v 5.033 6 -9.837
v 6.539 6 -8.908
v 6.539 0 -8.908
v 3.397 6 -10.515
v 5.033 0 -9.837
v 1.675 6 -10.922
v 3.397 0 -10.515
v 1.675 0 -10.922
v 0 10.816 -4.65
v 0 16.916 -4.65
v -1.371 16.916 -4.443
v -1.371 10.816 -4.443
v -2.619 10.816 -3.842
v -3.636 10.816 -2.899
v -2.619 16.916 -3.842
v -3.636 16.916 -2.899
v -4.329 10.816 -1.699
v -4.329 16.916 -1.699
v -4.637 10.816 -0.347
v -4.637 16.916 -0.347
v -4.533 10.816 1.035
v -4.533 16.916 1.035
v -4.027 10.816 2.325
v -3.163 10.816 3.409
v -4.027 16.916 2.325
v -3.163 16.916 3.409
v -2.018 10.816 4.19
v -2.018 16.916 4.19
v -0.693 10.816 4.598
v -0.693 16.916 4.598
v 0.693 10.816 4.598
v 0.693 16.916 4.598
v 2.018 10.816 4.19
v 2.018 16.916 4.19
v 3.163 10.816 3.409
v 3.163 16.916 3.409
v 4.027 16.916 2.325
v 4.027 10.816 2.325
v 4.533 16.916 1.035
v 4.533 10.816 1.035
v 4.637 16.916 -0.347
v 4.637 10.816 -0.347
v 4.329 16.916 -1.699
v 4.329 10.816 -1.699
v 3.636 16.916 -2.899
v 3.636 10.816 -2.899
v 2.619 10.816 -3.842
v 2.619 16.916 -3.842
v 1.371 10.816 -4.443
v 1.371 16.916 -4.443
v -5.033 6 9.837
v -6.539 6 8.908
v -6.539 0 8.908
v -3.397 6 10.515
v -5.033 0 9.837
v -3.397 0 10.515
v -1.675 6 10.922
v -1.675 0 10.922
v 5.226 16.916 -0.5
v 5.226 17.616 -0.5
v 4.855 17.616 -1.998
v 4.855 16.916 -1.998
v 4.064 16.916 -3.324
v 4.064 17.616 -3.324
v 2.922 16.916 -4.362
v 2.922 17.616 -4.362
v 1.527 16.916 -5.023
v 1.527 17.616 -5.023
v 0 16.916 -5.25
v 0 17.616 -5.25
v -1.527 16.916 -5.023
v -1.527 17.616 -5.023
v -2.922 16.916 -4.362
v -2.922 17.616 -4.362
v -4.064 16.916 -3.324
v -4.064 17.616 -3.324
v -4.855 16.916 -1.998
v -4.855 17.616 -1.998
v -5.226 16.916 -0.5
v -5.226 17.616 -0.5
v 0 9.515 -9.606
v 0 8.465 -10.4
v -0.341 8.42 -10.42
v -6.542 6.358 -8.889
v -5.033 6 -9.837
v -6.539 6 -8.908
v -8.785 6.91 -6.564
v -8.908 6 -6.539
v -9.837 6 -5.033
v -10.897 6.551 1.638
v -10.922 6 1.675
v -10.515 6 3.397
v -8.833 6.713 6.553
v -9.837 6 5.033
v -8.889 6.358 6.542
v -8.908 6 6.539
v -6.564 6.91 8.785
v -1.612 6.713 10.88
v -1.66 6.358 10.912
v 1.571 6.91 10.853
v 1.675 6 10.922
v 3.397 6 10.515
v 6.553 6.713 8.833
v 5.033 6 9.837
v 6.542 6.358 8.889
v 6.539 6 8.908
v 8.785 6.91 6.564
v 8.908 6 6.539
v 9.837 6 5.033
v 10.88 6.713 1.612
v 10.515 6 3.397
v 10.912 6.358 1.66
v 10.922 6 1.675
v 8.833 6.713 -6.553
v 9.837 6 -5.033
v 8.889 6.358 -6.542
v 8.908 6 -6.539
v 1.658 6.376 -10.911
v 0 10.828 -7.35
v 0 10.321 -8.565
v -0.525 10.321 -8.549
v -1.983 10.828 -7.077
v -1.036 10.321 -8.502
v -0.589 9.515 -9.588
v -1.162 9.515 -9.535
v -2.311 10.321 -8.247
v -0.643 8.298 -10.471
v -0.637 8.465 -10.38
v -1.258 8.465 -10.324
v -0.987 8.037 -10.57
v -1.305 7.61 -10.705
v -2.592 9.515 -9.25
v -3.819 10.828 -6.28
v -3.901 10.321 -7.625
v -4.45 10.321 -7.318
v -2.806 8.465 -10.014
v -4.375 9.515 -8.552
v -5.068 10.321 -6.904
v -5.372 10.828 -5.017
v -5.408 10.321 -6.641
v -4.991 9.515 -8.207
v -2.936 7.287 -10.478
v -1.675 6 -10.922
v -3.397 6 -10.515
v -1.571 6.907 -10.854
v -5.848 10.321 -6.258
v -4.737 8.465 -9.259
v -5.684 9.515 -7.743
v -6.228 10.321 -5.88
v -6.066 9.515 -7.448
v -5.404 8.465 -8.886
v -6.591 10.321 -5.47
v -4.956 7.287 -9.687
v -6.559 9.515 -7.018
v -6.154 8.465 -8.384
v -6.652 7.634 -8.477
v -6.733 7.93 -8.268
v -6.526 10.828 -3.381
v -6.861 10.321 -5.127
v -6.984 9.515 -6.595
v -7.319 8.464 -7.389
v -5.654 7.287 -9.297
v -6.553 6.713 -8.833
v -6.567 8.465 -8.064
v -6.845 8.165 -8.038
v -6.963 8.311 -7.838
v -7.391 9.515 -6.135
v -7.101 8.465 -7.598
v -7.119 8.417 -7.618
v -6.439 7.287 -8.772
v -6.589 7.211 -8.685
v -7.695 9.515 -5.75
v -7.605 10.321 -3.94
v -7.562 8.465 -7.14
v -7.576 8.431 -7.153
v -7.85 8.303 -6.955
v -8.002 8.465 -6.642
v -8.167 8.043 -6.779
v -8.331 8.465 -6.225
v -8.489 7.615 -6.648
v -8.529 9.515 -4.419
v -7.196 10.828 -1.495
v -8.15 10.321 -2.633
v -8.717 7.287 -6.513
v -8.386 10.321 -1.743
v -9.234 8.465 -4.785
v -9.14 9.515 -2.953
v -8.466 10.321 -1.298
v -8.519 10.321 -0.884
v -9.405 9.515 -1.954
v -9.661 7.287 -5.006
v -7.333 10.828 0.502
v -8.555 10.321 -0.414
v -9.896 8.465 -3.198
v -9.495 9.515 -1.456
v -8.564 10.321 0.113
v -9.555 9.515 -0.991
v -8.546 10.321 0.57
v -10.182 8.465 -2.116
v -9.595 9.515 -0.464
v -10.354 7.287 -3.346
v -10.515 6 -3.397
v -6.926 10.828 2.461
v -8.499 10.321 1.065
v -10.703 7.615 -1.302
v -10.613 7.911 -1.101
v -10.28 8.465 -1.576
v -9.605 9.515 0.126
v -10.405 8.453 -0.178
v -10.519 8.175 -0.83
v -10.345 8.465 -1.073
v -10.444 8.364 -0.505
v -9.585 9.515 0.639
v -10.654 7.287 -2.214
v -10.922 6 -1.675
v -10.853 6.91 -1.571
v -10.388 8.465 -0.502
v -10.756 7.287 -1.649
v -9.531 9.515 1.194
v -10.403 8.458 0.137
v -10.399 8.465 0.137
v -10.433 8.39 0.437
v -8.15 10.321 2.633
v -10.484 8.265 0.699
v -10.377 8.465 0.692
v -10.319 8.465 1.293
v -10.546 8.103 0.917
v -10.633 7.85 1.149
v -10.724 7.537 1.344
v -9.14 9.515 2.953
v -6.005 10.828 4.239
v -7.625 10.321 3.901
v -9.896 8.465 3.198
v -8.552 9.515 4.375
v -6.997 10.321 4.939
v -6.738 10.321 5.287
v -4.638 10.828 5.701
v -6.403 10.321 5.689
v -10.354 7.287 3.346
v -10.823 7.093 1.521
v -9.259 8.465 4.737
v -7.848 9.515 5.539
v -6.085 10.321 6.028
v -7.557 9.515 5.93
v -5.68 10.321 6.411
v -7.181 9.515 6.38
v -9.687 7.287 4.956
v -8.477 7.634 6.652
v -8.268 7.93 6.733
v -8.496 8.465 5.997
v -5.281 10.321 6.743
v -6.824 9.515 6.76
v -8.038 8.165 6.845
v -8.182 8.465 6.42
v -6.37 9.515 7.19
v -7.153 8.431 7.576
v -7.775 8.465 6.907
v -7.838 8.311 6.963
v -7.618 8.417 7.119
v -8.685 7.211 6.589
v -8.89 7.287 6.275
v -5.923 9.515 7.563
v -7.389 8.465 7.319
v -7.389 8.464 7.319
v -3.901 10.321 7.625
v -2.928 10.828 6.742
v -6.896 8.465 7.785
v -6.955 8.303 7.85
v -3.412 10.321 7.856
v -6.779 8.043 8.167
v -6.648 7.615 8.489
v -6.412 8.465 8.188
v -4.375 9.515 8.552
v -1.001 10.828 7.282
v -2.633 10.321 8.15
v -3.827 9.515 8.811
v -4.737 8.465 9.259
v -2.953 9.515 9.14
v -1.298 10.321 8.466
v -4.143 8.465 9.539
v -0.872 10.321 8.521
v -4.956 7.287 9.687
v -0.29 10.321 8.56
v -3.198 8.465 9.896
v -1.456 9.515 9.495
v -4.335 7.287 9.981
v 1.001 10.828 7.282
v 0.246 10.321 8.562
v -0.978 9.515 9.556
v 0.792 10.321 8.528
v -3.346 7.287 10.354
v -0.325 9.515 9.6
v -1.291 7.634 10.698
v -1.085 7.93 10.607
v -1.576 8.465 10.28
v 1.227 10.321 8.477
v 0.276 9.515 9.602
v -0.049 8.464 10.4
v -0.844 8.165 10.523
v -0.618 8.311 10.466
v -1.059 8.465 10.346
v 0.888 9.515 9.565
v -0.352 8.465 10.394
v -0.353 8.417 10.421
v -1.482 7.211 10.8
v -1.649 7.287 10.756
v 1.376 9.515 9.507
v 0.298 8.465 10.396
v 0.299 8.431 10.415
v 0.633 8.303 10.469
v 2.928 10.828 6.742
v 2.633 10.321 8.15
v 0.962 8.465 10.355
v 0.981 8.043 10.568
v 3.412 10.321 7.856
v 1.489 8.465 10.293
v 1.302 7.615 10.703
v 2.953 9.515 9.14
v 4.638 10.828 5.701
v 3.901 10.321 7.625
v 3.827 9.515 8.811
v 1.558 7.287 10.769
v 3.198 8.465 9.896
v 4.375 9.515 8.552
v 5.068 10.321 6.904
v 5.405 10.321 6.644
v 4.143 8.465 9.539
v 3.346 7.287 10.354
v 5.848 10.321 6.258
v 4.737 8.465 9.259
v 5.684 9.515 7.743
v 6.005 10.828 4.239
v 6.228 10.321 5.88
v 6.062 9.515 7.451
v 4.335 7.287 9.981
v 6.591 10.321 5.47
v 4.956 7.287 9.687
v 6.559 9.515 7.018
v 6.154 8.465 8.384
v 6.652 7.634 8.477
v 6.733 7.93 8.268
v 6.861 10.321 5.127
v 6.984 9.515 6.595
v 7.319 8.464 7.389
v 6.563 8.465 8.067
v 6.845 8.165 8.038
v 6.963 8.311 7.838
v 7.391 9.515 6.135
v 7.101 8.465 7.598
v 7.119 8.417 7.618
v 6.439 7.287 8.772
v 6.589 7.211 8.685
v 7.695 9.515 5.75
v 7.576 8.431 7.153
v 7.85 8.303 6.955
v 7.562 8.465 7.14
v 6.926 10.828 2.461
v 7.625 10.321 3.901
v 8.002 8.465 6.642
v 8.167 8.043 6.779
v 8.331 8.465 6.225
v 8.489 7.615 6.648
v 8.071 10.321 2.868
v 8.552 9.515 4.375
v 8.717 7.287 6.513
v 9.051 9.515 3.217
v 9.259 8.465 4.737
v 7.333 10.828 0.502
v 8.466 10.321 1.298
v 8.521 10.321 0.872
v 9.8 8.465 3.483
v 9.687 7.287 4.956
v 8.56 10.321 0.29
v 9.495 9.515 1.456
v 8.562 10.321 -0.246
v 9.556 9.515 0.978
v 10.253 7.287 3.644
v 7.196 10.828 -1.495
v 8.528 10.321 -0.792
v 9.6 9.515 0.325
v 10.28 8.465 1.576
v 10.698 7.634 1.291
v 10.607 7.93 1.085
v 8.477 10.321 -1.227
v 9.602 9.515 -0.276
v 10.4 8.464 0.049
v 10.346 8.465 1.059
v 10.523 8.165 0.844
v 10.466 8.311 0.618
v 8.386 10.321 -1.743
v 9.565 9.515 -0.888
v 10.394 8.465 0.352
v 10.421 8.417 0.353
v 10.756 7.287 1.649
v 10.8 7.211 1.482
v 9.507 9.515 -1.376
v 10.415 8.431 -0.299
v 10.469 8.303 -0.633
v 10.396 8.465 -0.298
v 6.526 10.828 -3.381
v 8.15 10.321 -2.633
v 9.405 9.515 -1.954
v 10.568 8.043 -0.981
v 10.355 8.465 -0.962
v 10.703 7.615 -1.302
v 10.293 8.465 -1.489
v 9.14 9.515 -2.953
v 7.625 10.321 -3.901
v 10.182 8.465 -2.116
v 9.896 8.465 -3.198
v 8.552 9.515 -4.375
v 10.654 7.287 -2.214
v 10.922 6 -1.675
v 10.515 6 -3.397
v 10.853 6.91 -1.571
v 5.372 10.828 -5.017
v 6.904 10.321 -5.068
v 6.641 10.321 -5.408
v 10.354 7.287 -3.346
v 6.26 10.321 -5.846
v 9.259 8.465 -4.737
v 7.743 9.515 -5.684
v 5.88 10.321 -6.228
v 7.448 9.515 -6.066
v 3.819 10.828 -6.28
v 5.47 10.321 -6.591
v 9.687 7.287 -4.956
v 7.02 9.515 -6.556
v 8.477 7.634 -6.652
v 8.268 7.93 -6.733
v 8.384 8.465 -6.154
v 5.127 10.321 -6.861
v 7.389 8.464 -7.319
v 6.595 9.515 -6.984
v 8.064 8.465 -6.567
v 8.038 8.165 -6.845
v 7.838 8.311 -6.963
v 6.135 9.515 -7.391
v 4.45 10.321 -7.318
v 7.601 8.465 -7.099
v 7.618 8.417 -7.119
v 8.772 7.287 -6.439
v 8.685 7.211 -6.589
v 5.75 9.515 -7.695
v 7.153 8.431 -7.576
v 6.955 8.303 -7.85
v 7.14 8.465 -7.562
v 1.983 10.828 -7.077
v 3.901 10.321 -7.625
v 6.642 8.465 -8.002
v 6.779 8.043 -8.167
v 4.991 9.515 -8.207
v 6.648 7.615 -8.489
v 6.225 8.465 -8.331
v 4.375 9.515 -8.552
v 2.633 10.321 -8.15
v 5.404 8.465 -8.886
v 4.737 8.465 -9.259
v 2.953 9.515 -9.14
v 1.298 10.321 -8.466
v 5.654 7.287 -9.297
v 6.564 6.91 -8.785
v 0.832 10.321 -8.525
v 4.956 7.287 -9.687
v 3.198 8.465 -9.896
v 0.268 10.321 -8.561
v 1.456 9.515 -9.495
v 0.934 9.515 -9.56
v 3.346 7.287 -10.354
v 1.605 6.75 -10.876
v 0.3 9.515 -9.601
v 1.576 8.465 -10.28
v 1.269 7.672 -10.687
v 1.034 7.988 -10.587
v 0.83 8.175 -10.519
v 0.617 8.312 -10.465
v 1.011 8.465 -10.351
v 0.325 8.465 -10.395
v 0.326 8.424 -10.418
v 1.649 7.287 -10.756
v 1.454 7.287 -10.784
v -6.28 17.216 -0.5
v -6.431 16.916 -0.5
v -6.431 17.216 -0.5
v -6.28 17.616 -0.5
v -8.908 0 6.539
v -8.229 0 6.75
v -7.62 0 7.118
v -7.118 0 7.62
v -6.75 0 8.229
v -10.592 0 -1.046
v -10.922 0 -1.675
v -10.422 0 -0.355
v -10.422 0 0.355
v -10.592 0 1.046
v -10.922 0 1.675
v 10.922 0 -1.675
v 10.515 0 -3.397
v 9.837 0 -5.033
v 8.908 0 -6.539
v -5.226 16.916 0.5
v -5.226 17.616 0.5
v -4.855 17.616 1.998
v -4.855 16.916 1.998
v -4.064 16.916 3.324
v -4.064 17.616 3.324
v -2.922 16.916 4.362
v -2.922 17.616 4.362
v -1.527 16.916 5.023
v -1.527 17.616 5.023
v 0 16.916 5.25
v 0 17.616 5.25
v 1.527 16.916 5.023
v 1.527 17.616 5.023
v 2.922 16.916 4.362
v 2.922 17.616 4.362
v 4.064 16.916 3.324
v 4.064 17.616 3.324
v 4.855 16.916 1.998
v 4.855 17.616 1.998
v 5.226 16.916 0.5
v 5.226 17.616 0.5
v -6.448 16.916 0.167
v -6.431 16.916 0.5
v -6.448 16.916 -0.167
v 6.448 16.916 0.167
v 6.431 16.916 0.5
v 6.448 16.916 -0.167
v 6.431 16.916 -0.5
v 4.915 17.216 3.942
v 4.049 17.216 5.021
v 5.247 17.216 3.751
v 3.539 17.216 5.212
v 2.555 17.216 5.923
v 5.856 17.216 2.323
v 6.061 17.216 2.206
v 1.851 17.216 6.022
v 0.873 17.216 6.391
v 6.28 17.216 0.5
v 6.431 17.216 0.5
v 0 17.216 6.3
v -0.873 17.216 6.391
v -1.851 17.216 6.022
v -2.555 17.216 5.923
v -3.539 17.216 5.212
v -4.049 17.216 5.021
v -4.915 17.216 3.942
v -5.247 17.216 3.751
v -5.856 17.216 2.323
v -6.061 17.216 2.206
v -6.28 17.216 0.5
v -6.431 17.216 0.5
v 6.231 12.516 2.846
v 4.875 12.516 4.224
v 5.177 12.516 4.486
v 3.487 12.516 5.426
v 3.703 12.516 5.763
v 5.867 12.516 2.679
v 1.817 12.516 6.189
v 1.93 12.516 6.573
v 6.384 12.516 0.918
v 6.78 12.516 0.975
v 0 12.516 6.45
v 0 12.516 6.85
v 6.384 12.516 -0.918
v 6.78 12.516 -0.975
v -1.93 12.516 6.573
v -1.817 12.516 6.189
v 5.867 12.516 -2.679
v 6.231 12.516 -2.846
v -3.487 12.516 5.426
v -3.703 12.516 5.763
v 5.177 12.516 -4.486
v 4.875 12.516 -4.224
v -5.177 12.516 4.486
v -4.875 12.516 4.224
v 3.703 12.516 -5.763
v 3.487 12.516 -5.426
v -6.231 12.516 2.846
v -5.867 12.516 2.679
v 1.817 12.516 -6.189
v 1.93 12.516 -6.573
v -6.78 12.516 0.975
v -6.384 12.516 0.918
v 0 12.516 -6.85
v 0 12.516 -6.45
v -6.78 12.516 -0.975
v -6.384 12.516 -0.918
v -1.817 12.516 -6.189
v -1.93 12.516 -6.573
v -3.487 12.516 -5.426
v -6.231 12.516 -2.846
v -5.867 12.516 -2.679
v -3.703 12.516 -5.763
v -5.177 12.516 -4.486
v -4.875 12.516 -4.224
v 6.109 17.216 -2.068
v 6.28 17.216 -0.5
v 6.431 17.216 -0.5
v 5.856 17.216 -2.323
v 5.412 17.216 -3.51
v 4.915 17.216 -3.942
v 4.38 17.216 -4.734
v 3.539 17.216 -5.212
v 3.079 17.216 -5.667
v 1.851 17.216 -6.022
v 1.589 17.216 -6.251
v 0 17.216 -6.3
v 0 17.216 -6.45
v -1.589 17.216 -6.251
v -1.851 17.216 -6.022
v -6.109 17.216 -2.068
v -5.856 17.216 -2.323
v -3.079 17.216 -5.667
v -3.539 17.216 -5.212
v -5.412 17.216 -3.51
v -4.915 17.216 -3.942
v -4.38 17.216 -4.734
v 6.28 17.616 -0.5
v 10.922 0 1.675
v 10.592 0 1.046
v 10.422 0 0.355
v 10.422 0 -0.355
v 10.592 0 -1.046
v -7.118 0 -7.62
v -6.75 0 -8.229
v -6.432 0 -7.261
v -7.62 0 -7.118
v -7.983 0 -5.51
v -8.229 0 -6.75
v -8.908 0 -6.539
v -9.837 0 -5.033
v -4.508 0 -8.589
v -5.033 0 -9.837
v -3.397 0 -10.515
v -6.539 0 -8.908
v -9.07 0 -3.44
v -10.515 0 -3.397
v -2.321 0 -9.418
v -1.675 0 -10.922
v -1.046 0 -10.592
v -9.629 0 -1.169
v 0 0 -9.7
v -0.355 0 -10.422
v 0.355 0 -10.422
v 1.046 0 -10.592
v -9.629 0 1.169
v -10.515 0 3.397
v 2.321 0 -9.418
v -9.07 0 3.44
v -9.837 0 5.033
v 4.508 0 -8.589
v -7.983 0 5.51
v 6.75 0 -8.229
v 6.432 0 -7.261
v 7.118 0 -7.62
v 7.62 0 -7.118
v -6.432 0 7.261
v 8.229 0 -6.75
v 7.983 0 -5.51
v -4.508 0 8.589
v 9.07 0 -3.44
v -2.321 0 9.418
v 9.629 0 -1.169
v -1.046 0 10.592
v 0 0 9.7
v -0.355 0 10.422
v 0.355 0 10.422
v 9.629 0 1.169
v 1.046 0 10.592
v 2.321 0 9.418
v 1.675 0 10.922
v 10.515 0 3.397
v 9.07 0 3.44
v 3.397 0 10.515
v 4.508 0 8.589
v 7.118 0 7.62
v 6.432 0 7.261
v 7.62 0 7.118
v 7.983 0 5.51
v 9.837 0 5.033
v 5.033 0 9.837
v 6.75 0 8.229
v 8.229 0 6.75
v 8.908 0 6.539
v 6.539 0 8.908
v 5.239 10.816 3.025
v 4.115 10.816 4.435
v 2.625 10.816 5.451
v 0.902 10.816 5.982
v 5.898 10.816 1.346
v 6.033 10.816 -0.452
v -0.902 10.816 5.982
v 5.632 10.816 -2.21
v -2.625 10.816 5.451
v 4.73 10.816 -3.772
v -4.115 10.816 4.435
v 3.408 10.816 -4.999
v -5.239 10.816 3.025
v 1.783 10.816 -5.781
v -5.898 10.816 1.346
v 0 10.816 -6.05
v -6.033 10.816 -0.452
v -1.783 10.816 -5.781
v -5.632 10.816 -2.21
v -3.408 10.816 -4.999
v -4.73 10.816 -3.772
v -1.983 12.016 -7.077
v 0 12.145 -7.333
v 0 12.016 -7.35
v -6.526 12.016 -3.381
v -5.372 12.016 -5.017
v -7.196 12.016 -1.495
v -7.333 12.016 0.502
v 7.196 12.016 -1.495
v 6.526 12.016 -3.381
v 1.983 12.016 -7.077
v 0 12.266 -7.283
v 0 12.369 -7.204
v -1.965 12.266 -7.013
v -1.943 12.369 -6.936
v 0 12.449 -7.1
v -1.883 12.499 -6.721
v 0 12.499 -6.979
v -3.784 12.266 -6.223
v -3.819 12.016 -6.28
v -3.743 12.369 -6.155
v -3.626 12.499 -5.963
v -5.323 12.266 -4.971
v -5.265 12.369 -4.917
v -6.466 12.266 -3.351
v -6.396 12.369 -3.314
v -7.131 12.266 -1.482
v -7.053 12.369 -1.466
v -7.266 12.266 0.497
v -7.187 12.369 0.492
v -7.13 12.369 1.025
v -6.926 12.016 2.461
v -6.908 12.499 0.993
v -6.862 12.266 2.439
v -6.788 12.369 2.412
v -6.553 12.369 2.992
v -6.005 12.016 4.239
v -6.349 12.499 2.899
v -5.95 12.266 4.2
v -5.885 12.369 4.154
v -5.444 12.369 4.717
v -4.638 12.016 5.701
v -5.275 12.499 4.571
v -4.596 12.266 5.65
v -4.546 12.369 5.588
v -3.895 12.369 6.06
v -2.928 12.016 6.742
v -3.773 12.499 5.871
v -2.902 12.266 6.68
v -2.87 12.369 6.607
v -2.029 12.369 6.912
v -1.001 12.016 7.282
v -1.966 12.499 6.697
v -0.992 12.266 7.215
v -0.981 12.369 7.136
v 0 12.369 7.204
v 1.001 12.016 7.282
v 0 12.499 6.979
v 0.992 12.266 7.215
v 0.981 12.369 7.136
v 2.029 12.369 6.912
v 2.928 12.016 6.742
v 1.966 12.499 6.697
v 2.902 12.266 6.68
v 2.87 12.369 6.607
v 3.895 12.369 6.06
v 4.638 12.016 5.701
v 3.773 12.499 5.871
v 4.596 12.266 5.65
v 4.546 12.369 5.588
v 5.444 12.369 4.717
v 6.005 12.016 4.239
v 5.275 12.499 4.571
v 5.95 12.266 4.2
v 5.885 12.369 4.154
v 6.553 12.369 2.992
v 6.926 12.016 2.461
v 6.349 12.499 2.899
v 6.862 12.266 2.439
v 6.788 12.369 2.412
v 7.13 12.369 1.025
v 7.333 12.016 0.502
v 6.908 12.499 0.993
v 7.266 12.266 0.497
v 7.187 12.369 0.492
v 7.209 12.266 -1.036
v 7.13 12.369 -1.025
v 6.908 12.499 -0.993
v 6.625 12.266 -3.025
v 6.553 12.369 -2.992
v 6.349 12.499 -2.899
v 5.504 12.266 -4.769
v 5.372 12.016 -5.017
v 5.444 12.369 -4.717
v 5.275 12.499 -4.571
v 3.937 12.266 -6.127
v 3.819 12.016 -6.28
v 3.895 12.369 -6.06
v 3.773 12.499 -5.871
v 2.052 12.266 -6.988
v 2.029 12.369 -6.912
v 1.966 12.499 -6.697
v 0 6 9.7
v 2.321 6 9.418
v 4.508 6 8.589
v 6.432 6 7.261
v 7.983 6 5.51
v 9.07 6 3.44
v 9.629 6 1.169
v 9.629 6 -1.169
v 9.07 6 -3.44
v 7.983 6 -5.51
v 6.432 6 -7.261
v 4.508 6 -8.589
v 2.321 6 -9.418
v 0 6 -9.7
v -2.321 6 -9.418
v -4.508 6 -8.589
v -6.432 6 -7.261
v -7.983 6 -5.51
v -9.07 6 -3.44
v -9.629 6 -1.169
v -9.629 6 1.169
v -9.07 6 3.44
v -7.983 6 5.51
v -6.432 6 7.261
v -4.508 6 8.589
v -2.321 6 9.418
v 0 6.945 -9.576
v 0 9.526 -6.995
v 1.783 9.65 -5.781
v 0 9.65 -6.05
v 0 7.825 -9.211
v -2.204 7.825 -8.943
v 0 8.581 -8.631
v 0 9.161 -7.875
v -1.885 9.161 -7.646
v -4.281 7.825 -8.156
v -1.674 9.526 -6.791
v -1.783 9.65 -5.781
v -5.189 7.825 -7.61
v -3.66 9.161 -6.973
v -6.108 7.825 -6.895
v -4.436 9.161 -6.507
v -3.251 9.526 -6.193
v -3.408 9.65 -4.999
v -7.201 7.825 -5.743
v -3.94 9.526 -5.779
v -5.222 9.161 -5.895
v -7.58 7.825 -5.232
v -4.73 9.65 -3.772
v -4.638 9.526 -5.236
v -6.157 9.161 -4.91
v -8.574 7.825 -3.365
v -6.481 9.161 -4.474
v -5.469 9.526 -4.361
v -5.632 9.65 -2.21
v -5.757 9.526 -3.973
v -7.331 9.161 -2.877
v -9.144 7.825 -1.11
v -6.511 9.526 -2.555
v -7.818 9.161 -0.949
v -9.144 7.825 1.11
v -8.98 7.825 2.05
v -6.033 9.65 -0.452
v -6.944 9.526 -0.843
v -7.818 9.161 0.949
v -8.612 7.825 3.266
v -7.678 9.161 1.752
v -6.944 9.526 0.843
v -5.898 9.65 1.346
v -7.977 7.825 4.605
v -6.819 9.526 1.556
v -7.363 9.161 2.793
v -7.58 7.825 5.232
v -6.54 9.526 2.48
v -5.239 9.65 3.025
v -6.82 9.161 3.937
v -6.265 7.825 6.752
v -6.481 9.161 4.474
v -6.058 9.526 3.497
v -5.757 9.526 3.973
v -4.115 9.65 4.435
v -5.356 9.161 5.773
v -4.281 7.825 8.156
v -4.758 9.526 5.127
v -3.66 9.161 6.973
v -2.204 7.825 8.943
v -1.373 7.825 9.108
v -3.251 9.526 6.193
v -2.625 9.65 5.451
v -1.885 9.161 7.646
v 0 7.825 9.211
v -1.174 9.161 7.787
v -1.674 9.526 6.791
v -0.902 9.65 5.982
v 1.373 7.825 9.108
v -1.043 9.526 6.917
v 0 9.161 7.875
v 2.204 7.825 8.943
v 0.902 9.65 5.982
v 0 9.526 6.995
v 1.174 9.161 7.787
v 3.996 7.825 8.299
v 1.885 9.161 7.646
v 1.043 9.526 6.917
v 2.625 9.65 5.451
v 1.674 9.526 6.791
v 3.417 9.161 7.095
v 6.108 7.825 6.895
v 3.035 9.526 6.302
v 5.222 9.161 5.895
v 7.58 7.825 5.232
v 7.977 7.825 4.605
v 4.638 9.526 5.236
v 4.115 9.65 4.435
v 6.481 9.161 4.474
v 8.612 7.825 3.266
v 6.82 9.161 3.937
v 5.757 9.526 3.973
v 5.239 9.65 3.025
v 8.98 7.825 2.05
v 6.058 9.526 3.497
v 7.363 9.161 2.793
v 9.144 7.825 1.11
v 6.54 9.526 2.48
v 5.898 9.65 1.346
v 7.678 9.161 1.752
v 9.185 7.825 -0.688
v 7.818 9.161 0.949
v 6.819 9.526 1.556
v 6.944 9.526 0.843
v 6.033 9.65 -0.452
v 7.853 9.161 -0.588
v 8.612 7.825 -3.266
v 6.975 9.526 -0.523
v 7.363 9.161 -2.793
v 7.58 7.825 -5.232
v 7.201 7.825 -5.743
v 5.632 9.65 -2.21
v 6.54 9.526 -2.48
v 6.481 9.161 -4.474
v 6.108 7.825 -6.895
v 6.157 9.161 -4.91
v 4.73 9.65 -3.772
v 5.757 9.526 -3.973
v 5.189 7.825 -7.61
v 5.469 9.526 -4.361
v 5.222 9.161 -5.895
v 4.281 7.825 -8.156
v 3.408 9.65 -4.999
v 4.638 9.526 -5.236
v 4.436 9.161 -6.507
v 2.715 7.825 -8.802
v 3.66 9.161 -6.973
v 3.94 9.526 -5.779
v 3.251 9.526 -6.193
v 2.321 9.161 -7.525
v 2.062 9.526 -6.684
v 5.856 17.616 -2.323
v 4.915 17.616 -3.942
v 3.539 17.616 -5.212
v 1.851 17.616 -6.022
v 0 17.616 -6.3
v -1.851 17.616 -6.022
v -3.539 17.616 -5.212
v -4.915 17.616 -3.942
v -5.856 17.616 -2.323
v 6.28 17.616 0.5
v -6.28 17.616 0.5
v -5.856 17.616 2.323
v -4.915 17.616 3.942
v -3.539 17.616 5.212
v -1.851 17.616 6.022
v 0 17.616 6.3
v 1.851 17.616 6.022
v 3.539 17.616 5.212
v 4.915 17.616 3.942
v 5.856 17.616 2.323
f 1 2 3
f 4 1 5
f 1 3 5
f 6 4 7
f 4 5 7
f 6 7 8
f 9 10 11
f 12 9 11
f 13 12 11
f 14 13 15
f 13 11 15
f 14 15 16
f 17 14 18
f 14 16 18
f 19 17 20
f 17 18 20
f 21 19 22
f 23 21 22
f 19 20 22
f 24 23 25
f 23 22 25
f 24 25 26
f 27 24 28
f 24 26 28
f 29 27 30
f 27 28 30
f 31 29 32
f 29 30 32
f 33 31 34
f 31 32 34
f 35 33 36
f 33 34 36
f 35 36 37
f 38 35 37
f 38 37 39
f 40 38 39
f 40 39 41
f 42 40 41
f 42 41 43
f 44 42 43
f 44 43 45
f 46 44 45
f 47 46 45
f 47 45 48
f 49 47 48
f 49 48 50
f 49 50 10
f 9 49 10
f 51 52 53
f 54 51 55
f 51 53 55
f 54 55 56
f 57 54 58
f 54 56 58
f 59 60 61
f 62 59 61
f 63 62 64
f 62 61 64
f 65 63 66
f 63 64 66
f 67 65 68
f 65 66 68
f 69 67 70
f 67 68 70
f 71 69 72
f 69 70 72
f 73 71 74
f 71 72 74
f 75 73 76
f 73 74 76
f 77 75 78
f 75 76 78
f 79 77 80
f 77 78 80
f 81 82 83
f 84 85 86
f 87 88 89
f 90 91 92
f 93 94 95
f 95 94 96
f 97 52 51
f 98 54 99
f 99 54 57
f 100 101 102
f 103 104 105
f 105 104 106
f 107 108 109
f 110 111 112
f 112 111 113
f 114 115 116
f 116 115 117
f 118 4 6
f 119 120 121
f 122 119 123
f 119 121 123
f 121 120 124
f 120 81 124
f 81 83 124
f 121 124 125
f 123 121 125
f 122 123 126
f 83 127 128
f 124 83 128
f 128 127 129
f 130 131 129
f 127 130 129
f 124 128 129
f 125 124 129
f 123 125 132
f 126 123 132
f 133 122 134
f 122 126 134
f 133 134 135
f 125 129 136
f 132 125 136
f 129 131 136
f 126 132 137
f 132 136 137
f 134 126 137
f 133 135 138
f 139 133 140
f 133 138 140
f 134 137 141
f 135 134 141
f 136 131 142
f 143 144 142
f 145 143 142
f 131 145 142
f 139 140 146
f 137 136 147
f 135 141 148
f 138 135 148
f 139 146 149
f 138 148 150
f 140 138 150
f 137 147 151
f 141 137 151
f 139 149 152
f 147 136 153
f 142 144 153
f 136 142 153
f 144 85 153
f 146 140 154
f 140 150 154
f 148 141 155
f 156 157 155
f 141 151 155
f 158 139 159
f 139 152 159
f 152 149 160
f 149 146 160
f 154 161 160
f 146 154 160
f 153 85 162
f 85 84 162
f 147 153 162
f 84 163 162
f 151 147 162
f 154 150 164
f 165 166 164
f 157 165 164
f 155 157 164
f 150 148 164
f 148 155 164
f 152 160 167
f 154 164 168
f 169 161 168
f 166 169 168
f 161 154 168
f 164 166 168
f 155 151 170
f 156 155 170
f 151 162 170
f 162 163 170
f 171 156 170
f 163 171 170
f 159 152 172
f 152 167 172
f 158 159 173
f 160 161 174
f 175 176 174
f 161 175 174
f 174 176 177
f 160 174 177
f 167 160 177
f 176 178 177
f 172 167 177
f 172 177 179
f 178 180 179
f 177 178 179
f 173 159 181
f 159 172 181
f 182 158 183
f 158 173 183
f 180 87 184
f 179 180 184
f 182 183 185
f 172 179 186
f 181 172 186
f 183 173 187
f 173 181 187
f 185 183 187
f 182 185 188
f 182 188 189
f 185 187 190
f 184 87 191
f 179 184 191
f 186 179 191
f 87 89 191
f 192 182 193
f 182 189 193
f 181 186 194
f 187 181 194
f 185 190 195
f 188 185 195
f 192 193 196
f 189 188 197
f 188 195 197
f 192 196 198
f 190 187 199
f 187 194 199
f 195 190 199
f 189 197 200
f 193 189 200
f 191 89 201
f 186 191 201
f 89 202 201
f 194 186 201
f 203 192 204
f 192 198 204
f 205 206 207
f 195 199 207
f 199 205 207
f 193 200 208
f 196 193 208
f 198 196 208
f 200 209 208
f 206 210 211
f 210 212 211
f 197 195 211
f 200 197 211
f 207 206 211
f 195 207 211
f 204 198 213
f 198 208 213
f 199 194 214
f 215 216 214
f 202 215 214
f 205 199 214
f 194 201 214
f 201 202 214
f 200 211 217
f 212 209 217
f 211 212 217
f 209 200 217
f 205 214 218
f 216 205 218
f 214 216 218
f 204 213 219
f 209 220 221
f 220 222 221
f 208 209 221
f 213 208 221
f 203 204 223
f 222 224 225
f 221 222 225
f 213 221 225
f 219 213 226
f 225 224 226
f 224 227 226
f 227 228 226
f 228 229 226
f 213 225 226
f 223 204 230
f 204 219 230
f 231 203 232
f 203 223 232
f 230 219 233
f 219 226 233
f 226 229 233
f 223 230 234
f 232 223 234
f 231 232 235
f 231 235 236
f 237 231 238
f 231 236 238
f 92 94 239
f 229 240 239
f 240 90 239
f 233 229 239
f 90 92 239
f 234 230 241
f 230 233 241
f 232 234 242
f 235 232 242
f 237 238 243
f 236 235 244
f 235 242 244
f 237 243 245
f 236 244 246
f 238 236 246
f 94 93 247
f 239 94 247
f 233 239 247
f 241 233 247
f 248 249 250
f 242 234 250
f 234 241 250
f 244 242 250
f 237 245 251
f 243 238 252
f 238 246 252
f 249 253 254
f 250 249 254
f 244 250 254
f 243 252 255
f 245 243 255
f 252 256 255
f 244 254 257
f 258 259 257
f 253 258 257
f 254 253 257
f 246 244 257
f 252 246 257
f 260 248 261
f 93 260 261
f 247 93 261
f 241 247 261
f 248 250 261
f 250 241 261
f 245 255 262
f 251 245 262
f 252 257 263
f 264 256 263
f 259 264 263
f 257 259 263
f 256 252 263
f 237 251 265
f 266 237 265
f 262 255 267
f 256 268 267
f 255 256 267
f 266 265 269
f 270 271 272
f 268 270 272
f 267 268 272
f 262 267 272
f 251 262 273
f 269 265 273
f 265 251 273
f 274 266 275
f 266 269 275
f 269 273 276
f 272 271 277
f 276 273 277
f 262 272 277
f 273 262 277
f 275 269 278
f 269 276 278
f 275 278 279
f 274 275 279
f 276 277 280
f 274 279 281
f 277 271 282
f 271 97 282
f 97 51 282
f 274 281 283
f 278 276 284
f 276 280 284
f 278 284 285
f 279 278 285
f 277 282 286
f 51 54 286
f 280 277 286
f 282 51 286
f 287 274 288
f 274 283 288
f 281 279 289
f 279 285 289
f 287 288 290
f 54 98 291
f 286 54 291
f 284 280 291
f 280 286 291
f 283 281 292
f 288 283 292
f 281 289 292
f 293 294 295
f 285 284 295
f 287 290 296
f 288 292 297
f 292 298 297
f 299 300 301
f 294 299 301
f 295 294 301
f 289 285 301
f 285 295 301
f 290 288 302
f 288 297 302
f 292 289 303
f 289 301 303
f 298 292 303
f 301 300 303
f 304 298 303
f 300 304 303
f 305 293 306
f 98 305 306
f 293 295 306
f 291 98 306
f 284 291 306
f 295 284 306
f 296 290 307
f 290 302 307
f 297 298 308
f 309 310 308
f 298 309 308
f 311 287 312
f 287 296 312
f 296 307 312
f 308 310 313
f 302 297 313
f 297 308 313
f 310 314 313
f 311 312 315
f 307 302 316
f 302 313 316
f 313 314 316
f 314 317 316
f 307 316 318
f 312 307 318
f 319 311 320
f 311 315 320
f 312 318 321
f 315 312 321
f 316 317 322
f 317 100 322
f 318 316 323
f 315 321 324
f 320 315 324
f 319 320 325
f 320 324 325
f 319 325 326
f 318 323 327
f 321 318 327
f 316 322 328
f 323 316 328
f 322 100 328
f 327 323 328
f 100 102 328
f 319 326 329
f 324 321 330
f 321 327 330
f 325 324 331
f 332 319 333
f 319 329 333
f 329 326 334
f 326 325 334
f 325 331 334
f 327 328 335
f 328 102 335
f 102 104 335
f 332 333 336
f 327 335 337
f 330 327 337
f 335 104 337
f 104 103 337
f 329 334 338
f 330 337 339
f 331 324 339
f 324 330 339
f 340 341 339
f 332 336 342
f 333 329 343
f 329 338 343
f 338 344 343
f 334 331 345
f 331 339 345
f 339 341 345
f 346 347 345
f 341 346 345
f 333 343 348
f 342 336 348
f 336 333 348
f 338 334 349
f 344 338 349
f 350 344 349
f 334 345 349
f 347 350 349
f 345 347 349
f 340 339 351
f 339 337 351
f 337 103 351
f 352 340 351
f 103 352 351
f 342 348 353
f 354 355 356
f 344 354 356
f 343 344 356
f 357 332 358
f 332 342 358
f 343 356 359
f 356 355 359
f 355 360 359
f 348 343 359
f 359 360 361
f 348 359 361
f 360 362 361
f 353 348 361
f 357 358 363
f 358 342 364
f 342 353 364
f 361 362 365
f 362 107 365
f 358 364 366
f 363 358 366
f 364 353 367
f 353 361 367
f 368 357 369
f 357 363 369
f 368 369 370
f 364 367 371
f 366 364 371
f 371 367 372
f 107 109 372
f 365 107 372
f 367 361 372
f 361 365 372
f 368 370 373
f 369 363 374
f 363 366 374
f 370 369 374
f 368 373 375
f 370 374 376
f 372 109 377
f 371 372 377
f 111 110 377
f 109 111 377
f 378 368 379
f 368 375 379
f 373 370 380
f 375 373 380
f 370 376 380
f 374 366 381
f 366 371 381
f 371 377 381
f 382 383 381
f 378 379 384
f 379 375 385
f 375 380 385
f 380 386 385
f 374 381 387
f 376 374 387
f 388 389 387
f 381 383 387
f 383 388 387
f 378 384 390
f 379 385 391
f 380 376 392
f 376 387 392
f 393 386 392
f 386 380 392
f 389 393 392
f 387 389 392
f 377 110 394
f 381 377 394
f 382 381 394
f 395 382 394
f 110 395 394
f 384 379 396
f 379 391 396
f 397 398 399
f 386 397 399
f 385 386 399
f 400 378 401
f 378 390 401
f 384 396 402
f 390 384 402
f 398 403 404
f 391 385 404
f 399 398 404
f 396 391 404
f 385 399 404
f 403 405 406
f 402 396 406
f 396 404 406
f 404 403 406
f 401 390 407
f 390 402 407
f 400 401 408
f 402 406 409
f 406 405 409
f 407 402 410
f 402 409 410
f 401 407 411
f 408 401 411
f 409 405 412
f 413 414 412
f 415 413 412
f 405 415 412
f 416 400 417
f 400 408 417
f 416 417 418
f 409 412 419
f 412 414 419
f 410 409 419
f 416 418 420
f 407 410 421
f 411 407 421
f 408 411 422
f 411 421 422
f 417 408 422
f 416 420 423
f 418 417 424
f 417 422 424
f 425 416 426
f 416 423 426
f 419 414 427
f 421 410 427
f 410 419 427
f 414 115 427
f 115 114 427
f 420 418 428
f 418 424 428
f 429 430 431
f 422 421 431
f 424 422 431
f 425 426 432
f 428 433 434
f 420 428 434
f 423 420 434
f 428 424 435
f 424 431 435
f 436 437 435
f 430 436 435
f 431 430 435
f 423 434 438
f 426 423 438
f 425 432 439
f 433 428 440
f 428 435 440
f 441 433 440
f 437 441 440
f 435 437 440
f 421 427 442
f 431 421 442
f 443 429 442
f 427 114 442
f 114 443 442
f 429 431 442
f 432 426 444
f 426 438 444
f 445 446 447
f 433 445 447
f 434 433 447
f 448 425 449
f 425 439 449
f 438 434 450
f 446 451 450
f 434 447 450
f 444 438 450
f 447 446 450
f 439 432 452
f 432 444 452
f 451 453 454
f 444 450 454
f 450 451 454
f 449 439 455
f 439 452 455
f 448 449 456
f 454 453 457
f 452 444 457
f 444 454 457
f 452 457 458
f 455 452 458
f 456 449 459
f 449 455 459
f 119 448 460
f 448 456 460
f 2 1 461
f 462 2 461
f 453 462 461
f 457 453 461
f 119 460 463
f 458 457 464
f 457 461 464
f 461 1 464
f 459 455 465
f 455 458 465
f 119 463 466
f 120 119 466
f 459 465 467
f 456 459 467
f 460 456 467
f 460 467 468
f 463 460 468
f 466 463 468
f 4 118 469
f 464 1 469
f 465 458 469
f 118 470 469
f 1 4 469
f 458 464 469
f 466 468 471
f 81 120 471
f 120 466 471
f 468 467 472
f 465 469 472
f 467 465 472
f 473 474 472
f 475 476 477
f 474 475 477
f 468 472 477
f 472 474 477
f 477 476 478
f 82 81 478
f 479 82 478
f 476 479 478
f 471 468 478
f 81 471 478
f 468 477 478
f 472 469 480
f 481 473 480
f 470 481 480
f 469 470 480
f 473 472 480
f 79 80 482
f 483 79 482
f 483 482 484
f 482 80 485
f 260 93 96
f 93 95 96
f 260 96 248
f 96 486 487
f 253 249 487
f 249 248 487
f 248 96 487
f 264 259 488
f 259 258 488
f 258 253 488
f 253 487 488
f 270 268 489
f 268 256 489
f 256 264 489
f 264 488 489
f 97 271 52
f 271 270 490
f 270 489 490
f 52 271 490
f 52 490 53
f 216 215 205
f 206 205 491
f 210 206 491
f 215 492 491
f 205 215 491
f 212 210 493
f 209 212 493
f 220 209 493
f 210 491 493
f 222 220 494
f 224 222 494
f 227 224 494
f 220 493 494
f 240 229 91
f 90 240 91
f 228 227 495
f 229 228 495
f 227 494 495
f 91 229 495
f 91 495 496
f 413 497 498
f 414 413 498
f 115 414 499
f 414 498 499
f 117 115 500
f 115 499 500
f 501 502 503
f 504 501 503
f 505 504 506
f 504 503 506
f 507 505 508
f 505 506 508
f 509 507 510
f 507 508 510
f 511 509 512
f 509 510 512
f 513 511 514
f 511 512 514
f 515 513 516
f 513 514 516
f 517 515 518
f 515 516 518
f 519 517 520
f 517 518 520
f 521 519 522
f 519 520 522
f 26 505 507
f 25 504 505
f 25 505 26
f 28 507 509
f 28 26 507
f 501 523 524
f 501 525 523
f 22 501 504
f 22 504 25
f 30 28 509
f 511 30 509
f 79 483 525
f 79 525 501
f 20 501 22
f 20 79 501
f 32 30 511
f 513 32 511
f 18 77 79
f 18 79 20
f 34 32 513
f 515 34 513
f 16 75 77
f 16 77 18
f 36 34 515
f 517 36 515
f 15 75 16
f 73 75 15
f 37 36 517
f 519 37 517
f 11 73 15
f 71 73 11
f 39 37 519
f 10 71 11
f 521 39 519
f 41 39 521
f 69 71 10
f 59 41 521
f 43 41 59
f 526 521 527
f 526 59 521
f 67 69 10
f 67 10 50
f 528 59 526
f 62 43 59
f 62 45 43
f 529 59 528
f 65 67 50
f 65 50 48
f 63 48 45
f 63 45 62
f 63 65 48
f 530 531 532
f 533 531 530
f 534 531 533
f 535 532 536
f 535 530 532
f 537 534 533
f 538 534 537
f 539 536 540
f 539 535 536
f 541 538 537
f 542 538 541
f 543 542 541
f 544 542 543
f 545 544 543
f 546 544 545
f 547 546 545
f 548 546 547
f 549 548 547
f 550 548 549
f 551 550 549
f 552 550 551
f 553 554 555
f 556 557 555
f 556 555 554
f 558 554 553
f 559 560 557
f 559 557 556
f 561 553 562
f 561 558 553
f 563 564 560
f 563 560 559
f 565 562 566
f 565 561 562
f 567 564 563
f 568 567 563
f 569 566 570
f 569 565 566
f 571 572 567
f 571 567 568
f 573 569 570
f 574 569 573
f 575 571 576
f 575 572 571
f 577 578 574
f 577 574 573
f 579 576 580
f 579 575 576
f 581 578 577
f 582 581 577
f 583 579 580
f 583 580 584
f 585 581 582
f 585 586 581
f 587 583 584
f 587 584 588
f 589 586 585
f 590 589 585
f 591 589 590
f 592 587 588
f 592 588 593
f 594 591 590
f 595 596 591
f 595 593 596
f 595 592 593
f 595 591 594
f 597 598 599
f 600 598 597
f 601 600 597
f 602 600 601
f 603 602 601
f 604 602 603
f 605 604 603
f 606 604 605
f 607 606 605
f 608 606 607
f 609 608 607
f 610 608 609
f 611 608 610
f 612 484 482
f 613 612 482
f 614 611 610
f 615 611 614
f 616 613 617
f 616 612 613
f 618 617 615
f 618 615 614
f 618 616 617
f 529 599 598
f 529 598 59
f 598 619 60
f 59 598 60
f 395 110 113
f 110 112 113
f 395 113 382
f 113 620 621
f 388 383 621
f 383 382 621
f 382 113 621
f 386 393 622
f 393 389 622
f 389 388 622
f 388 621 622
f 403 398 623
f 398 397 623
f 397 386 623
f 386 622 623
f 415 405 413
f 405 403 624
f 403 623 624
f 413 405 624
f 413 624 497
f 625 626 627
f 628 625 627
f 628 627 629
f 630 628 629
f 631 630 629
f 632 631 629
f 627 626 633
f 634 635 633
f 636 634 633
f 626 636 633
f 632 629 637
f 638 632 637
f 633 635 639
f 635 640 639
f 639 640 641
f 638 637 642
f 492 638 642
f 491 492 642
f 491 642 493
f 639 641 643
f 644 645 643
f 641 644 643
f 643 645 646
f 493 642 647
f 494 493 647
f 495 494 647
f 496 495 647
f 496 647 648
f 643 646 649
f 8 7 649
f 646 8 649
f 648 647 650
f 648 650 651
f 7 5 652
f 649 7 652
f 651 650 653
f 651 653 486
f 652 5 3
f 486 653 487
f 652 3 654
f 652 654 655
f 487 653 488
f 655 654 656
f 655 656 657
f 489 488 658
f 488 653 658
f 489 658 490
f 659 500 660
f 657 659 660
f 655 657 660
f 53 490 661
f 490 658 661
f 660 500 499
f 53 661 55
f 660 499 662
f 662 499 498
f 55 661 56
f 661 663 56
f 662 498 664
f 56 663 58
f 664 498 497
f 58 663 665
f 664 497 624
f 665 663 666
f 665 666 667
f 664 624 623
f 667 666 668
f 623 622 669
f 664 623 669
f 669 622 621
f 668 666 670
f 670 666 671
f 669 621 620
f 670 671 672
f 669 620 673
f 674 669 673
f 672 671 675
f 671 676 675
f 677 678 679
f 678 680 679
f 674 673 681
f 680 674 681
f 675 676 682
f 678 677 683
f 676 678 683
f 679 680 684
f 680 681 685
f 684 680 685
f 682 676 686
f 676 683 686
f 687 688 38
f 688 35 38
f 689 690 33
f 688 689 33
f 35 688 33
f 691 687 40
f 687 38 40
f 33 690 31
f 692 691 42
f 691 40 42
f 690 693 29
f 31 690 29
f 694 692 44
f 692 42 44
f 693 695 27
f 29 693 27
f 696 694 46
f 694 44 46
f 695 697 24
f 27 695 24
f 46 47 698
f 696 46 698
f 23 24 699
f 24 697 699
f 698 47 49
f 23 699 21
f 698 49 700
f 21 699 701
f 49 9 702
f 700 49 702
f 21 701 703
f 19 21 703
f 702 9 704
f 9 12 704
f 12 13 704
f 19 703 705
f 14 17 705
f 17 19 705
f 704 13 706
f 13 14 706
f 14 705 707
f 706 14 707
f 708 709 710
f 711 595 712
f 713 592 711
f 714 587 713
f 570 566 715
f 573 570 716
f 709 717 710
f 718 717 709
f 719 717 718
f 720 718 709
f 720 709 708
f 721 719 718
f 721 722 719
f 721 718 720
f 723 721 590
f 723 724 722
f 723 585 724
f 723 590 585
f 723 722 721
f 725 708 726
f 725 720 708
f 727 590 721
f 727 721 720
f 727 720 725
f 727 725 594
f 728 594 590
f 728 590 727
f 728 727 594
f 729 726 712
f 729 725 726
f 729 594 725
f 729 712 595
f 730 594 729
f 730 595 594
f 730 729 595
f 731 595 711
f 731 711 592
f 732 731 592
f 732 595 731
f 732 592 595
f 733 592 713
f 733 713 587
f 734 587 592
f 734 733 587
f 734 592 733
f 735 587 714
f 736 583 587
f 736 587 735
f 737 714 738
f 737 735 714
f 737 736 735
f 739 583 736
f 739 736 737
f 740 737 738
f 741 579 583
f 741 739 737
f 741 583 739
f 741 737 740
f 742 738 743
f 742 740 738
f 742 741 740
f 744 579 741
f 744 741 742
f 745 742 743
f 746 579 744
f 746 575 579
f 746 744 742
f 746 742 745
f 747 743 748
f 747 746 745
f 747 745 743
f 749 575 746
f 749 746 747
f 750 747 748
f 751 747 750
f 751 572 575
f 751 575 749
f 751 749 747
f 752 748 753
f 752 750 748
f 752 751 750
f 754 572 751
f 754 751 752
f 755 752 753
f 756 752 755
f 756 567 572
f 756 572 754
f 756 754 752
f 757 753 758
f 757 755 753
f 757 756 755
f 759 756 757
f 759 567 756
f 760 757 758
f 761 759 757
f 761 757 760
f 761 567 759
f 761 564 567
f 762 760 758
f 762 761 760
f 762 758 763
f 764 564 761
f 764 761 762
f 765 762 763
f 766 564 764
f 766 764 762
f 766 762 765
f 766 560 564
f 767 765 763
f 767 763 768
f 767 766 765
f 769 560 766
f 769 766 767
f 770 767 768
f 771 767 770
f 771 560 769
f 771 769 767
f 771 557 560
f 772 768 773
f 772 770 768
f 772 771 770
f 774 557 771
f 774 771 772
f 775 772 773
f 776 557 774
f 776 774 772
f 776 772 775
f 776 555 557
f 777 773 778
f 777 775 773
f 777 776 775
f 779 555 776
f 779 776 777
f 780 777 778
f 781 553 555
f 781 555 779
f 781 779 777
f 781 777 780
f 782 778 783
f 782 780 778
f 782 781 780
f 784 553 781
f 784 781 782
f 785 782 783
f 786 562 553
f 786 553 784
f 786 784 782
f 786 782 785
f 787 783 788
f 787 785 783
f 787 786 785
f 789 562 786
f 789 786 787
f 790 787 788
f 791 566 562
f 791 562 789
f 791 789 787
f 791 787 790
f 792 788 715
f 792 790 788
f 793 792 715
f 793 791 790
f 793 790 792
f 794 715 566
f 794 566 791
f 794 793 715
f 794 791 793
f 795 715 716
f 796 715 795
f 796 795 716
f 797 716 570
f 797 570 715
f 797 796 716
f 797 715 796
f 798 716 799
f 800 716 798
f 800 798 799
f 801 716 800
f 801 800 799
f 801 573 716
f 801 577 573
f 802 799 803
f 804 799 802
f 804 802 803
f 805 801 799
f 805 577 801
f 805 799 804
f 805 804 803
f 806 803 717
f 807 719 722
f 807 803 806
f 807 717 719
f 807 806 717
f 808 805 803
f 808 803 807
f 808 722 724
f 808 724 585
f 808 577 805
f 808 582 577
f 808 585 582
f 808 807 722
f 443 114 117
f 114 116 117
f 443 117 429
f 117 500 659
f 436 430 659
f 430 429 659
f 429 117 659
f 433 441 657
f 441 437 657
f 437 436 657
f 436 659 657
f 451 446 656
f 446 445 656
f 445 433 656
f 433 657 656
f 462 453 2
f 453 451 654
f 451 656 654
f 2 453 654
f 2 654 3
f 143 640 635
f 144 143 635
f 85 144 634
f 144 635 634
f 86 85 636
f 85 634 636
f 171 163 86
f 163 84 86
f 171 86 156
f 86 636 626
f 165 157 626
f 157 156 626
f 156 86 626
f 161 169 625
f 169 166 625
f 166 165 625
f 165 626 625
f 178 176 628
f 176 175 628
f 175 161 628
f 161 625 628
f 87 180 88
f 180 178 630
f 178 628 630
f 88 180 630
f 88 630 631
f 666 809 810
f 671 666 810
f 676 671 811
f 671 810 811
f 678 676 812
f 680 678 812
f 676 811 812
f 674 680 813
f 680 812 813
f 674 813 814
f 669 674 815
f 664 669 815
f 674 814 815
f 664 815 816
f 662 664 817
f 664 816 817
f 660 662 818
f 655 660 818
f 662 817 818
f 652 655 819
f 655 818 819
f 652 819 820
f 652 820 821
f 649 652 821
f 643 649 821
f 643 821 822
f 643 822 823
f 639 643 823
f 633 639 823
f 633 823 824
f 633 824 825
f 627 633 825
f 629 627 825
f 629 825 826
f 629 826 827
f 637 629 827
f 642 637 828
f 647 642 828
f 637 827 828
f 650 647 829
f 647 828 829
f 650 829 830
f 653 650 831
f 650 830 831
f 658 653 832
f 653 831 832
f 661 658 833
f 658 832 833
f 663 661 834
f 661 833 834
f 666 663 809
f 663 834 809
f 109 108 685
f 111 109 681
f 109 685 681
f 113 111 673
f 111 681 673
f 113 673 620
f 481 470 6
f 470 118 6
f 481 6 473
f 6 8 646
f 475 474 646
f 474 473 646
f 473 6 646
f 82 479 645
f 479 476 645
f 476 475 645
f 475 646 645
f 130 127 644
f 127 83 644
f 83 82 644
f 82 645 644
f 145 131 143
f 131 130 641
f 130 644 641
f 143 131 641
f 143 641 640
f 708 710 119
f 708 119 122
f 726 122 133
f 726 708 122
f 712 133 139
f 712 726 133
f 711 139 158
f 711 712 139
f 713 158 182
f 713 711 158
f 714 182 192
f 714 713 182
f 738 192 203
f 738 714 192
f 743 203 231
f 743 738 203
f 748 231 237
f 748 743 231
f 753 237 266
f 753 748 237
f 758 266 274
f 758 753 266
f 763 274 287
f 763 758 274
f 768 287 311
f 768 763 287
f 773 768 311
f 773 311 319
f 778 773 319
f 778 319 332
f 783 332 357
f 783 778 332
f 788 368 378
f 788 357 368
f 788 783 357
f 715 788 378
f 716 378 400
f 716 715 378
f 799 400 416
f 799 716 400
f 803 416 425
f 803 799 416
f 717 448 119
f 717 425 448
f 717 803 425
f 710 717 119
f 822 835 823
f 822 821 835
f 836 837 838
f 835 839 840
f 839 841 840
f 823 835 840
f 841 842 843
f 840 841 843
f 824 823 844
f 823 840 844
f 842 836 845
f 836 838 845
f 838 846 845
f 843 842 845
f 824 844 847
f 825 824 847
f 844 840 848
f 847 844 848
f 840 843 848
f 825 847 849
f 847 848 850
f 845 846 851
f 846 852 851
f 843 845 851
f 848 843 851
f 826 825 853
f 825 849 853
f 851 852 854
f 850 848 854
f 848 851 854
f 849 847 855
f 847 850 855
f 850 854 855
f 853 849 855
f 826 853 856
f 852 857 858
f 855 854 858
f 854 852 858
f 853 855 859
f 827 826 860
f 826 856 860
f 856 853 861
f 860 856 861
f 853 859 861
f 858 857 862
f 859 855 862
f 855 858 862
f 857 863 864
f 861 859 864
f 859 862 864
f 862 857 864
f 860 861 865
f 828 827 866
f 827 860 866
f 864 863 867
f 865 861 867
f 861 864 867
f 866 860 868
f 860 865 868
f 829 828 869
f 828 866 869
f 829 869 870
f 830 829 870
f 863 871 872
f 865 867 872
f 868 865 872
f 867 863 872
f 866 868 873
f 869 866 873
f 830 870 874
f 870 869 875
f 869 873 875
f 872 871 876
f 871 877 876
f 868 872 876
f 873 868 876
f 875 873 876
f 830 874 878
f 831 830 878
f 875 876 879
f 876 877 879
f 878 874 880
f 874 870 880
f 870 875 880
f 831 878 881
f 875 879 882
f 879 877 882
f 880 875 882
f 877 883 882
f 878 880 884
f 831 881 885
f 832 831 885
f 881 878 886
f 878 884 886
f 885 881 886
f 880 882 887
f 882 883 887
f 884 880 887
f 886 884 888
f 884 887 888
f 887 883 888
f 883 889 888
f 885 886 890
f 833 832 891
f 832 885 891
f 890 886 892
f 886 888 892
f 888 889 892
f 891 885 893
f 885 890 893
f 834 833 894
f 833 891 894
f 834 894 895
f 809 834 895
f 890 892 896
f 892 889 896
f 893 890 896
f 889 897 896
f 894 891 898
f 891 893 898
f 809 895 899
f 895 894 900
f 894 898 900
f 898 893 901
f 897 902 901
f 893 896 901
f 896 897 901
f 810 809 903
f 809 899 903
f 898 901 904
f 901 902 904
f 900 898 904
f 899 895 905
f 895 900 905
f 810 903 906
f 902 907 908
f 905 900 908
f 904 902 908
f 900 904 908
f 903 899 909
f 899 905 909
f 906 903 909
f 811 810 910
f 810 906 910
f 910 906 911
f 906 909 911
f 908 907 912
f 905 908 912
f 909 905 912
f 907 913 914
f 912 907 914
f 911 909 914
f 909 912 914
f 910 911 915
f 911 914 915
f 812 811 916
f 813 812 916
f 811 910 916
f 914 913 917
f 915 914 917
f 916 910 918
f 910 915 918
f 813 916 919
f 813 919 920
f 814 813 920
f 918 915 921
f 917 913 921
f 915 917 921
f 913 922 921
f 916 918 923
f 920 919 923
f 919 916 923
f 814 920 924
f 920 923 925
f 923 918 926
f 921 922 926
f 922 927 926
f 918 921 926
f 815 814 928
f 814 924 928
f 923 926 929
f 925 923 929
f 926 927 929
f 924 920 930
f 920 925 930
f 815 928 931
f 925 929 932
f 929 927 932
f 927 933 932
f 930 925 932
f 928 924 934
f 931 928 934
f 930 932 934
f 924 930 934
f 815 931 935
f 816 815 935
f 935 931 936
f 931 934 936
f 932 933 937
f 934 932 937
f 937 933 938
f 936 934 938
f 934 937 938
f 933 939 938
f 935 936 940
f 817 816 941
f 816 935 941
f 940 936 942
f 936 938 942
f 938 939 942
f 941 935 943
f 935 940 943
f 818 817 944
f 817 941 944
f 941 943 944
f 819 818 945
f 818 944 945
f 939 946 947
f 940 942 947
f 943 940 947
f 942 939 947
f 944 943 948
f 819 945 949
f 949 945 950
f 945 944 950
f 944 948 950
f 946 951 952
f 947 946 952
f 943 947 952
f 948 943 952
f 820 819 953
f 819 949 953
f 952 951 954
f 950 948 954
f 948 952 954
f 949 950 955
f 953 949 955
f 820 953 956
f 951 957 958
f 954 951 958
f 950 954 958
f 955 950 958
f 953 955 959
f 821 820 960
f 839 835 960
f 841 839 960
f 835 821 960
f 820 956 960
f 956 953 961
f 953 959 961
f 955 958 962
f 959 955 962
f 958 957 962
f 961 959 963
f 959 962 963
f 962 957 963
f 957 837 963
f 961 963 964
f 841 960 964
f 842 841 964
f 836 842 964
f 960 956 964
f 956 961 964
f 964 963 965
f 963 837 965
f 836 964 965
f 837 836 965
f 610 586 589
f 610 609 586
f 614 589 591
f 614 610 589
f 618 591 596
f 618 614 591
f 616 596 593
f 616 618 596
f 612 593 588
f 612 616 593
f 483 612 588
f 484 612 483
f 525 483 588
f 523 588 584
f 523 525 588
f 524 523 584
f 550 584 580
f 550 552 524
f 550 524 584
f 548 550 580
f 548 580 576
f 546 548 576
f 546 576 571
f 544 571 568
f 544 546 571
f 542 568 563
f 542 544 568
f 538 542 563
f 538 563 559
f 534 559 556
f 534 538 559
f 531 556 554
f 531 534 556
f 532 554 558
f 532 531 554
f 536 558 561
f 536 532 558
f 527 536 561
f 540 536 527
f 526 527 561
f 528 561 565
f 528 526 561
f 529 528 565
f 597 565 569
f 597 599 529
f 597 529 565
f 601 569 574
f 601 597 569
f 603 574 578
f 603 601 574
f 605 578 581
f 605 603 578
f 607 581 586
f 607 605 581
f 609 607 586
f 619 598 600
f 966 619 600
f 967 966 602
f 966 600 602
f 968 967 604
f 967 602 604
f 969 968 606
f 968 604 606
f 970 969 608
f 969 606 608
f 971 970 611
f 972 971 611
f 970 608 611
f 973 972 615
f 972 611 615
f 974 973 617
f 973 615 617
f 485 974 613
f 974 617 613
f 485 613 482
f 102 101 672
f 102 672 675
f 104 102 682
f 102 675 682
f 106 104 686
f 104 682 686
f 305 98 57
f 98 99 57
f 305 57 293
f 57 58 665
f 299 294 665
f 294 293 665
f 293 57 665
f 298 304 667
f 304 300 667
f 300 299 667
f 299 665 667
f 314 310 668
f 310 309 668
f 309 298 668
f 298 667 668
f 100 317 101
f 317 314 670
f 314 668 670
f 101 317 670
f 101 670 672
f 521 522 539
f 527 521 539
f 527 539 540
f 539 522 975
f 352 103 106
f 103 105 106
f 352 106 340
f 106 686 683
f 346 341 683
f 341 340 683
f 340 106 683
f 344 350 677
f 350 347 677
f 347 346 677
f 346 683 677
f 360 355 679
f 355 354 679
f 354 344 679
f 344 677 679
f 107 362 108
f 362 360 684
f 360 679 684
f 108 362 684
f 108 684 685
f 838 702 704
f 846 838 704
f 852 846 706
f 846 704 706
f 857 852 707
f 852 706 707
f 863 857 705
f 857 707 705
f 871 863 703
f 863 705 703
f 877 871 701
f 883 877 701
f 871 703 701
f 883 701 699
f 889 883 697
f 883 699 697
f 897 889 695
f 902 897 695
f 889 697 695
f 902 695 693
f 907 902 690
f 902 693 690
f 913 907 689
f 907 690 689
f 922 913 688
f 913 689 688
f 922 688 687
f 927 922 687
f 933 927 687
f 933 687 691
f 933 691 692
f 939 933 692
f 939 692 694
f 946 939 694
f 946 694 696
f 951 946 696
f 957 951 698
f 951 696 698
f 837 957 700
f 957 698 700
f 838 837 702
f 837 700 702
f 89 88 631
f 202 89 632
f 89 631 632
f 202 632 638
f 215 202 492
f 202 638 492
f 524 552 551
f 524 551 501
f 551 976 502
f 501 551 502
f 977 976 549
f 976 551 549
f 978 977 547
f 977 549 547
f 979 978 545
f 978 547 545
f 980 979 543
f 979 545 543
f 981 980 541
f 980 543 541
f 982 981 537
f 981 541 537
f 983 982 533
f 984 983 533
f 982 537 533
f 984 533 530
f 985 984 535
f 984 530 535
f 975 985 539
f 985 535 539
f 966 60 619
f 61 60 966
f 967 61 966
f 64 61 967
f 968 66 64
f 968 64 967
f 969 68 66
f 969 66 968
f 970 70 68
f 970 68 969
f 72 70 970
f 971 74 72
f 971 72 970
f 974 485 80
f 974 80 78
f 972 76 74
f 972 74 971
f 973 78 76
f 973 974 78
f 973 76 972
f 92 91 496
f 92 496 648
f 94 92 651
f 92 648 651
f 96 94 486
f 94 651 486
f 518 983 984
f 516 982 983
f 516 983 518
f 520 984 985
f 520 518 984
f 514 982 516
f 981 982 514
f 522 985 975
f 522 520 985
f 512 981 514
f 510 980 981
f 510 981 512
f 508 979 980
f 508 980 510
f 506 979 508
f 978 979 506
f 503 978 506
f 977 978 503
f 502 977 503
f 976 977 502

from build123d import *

# Parameters (mm, degrees)
CROQUIS1_R              = 11.05
SALIENTE_EXTRUIR2_DEPTH = 6
CROQUIS3_R              = 9.7
CORTAR_EXTRUIR2_DEPTH   = 6
CROQUIS7_R              = 2.94693617
CROQUIS7_R_2            = 2.946936168
CORTAR_EXTRUIR3_DEPTH   = 10.56
CROQUIS8_W              = 2.7
CROQUIS8_H              = 1.7
REDONDEO1_R             = 0.5
CROQUIS9_W              = 1.8
CROQUIS9_H              = 5.1
CORTAR_EXTRUIR7_START   = -0.4
CROQUIS14_R             = 6.45
CROQUIS14_R_2           = 6.3
CORTAR_EXTRUIR7_DEPTH   = 0.4
CORTAR_EXTRUIR8_DEPTH   = 0.7


with BuildPart() as part:
    # Croquis1 → Saliente-Extruir2 (new body)
    with BuildSketch(Plane(origin=(0, 0, 0), x_dir=(1, 0, 0), z_dir=(0, 1, 0))):
        with Locations(Location((0, 0, 0), (0, 0, 270))):
            Circle(CROQUIS1_R)
    extrude(amount=SALIENTE_EXTRUIR2_DEPTH)

    # Croquis3 → Cortar-Extruir2 (cut)
    with BuildSketch(Plane(origin=(0, 6, 0), x_dir=(1, 0, 0), z_dir=(0, 1, 0))):
        with Locations(Location((0, 0, 0), (0, 0, 270))):
            Circle(CROQUIS3_R)
    extrude(amount=-CORTAR_EXTRUIR2_DEPTH, mode=Mode.SUBTRACT)

    # Croquis4 → Revolución1 (revolve)
    with BuildSketch(Plane.XY, mode=Mode.PRIVATE) as revoluci_n1_sk:
        with BuildLine():
            Line((6.05, 9.65), (6.05, 11))
            ThreePointArc((6.05, 11), (9.585533906, 9.535533906), (11.05, 6))
            Line((11.05, 6), (9.7, 6))
            ThreePointArc((9.7, 6), (8.630939751, 8.580939751), (6.05, 9.65))
        make_face()
    revolve(revoluci_n1_sk.sketch.rotate(Axis((0, 0, 0), (0, 1, 0)), 90), axis=Axis((0, 0, 0), (0, 1, 0)))

    # Croquis7 → Cortar-Extruir3 (cut)
    with BuildSketch(Plane.XZ):
        with Locations((0, 13.34693617)):
            Circle(CROQUIS7_R)
        with Locations((-9.437709072, 9.437709072)):
            Circle(CROQUIS7_R_2)
        with Locations((9.437709074, 9.437709074)):
            Circle(CROQUIS7_R)
        with Locations((13.34693617, 0)):
            Circle(CROQUIS7_R)
        with Locations((9.437709074, -9.437709074)):
            Circle(CROQUIS7_R)
        with Locations((0, -13.34693617)):
            Circle(CROQUIS7_R)
        with Locations((-9.437709074, -9.437709074)):
            Circle(CROQUIS7_R)
        with Locations((-13.34693617, 0)):
            Circle(CROQUIS7_R)
    extrude(amount=-CORTAR_EXTRUIR3_DEPTH, mode=Mode.SUBTRACT)

    # Croquis8 → Revolución2 (revolve)
    with BuildSketch(Plane.XY, mode=Mode.PRIVATE) as revoluci_n2_sk:
        with Locations((-6, 11.665880959)):
            Rectangle(CROQUIS8_W, CROQUIS8_H)
    revolve(revoluci_n2_sk.sketch.rotate(Axis((0, 0, 0), (0, 1, 0)), 270), axis=Axis((0, 0, 0), (0, 1, 0)))

    # Redondeo1
    redondeo1_edges = [part.edges().sort_by_distance(p)[0] for p in [
        (0, 12.515880959, 7.35),
    ]]
    fillet(redondeo1_edges, radius=REDONDEO1_R)

    # Croquis9 → Revolución3 (revolve)
    with BuildSketch(Plane.XY, mode=Mode.PRIVATE) as revoluci_n3_sk:
        with Locations((-5.55, 15.065880959)):
            Rectangle(CROQUIS9_W, CROQUIS9_H)
    revolve(revoluci_n3_sk.sketch.rotate(Axis((0, 0, 0), (0, 1, 0)), 270), axis=Axis((0, 0, 0), (0, 1, 0)))

    # Croquis14 → Cortar-Extruir7 (cut)
    with BuildSketch(Plane(origin=(0, 17.615880959, 0), x_dir=(1, 0, 0), z_dir=(0, 1, 0)).offset(CORTAR_EXTRUIR7_START)):
        with Locations(Location((0, 0, 0), (0, 0, 90))):
            Circle(CROQUIS14_R)
        with Locations(Location((0, 0, 0), (0, 0, 270))):
            Circle(CROQUIS14_R_2, mode=Mode.SUBTRACT)
    extrude(amount=CORTAR_EXTRUIR7_DEPTH, mode=Mode.SUBTRACT)

    # Croquis10 → Cortar-Extruir8 (cut)
    with BuildSketch(Plane(origin=(0, 17.615880959, 0), x_dir=(1, 0, 0), z_dir=(0, 1, 0))):
        with BuildLine():
            Line((-6.45, -0.5), (-5.22613624, -0.5))
            ThreePointArc((-5.22613624, -0.5), (0, -5.25), (5.22613624, -0.5))
            Line((5.22613624, -0.5), (6.45, -0.5))
            Line((6.45, -0.5), (6.45, 0.5))
            Line((6.45, 0.5), (5.22613624, 0.5))
            ThreePointArc((5.22613624, 0.5), (0, 5.25), (-5.22613624, 0.5))
            Line((-5.22613624, 0.5), (-6.45, 0.5))
            Line((-6.45, 0.5), (-6.45, -0.5))
        make_face()
    extrude(amount=-CORTAR_EXTRUIR8_DEPTH, mode=Mode.SUBTRACT)


solid = part.part
